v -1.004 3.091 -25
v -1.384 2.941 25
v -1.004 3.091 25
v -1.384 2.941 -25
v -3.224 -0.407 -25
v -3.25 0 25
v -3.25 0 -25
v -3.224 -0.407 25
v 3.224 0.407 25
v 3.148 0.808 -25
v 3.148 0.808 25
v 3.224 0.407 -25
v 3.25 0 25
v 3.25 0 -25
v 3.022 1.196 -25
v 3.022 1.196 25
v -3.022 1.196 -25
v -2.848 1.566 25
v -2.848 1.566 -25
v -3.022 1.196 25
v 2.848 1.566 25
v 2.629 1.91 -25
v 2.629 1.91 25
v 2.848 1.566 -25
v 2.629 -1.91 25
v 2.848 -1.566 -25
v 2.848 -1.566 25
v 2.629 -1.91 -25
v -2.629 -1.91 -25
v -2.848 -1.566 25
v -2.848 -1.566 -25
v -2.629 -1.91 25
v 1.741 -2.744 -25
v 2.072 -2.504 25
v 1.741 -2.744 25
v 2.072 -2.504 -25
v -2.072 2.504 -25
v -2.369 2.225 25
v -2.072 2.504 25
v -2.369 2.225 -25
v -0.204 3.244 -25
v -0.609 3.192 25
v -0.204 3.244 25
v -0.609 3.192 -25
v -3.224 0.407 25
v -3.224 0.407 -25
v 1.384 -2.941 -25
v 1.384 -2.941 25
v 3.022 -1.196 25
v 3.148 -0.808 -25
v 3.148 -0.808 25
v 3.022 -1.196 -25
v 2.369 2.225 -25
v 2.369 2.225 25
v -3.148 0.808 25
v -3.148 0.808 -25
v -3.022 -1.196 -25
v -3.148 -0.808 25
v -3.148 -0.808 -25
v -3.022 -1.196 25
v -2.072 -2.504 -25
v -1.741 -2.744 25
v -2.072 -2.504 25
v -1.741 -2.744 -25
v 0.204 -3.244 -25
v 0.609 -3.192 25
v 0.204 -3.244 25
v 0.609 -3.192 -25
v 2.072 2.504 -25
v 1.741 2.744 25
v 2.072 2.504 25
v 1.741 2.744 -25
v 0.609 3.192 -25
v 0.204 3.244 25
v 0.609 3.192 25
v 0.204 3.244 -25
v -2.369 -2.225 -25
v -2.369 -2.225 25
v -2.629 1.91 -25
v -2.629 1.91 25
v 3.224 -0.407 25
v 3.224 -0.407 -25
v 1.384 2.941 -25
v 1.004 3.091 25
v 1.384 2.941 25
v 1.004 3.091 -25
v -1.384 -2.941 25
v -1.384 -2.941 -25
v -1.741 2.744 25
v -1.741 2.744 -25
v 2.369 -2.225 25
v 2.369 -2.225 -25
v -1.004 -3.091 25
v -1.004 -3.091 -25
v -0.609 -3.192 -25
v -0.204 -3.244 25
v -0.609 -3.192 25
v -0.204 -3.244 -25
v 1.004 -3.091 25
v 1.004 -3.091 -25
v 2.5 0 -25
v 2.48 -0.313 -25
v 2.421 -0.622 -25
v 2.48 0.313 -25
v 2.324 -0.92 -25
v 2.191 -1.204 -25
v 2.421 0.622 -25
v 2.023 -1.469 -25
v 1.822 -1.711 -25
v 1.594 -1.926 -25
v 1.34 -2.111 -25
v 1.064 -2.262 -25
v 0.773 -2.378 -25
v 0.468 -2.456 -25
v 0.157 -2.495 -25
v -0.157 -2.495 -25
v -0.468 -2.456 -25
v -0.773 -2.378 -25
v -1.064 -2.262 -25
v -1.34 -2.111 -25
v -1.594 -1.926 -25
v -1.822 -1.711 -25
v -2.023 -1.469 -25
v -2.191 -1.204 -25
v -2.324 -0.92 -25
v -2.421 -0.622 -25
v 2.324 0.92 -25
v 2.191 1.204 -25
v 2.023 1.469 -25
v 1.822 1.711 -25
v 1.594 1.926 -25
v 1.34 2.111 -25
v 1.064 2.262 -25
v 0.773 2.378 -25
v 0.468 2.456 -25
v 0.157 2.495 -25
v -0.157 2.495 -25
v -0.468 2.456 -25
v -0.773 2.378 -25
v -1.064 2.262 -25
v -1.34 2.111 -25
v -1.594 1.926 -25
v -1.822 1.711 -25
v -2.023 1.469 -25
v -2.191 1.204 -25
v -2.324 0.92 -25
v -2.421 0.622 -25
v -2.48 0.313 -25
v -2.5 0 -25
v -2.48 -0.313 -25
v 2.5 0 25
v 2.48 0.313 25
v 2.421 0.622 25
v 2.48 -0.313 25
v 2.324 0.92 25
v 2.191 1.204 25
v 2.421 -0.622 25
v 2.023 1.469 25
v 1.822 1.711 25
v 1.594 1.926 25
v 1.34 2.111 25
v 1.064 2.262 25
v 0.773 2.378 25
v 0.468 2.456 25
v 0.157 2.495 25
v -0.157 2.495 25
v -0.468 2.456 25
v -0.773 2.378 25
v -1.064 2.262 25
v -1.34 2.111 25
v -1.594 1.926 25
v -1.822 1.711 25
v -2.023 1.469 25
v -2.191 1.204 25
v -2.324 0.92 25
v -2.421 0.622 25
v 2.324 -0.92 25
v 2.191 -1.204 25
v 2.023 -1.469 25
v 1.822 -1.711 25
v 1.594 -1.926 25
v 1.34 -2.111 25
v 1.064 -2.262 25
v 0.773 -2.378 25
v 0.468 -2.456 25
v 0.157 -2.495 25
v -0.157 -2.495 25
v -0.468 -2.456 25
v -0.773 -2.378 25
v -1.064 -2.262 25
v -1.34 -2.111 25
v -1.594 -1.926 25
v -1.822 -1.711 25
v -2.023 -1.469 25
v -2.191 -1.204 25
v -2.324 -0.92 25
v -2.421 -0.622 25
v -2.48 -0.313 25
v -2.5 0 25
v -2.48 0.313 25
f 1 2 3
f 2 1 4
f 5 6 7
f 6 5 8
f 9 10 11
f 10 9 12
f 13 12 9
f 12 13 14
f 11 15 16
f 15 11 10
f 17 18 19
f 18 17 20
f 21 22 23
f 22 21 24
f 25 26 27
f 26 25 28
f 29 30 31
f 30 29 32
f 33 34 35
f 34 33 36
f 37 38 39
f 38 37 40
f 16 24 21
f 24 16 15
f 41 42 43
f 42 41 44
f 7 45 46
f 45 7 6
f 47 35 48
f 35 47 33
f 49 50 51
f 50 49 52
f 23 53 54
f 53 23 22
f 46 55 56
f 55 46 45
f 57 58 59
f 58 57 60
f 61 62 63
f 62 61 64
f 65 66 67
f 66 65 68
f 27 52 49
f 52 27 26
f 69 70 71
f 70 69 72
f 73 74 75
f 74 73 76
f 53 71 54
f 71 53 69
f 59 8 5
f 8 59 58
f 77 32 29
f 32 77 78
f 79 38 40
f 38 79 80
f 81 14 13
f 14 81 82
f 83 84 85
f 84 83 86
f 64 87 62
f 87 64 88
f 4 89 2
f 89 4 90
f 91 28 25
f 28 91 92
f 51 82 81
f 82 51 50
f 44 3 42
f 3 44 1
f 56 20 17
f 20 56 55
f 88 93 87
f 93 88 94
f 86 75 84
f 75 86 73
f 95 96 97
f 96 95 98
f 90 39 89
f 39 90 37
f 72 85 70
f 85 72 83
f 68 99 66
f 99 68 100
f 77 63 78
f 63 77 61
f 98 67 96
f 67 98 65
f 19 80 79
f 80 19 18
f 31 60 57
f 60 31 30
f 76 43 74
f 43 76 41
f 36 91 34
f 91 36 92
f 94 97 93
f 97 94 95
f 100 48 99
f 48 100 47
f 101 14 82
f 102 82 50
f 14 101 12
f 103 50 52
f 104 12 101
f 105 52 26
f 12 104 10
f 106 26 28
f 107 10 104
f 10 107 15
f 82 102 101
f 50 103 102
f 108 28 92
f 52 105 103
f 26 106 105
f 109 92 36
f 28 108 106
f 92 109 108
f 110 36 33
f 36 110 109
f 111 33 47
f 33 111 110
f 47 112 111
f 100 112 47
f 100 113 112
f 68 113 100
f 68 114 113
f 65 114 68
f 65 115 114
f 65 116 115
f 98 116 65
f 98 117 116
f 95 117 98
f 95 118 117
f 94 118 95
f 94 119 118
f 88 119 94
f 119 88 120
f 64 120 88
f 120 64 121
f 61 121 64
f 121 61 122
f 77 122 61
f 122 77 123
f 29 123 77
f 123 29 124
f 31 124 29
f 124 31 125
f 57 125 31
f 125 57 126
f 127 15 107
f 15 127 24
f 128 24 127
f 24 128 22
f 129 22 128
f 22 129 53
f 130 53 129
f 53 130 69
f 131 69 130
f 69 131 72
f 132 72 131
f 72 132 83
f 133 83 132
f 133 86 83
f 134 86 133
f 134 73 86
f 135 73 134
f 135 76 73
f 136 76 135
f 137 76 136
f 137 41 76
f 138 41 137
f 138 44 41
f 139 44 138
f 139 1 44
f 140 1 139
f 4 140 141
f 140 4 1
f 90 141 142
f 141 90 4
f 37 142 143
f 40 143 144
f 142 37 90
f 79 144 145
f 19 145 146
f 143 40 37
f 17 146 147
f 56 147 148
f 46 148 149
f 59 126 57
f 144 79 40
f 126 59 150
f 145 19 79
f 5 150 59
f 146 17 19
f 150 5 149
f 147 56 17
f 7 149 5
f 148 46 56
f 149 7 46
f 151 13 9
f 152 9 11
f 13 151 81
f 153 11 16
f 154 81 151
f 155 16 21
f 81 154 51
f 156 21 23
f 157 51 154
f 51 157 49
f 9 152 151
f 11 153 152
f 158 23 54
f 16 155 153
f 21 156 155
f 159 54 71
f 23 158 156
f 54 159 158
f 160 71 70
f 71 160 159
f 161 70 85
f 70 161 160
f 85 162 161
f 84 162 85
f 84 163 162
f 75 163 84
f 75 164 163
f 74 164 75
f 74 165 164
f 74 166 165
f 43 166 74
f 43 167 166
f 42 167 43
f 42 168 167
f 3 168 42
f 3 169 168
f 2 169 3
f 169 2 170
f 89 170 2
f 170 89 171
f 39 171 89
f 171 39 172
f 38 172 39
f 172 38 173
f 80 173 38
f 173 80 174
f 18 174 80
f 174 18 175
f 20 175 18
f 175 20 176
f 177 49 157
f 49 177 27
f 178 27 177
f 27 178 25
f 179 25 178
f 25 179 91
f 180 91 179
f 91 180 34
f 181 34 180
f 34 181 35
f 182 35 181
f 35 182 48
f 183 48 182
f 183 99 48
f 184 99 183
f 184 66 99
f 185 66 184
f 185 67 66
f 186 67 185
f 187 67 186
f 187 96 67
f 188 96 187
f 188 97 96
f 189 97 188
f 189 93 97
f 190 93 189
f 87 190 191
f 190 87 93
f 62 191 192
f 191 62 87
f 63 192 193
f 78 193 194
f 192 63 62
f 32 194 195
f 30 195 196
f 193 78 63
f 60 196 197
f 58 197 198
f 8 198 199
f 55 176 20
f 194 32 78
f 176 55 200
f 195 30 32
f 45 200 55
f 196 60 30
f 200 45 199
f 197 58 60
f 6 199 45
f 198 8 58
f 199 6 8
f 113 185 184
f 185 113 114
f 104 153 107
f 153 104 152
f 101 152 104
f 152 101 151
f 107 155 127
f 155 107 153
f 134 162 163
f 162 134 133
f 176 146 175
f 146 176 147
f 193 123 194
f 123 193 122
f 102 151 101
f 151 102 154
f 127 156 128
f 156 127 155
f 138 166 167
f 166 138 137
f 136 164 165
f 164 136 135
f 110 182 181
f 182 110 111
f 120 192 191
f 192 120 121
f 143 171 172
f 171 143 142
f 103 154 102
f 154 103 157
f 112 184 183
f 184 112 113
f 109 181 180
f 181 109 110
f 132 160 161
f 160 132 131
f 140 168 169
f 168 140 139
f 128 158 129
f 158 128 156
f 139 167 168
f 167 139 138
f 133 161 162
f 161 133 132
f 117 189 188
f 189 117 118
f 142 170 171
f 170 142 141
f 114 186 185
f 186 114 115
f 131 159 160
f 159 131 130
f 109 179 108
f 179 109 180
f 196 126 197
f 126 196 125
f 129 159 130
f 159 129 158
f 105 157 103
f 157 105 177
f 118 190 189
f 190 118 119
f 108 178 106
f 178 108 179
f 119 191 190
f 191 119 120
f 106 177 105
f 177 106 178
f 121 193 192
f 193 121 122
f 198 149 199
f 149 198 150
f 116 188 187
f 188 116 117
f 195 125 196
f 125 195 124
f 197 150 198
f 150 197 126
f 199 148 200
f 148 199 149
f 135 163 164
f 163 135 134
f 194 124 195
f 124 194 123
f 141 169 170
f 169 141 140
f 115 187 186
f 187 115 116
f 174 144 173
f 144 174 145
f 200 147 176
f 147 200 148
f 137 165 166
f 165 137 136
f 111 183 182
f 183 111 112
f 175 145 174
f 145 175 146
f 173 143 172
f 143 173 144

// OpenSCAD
$fn = 50;


difference() {
	union() {
		translate(v = [0, 0, -25.0000000000]) {
			cylinder(h = 50, r = 3.2500000000);
		}
	}
	union() {
		translate(v = [0, 0, -100.0000000000]) {
			cylinder(h = 200, r = 2.5000000000);
		}
	}
}
